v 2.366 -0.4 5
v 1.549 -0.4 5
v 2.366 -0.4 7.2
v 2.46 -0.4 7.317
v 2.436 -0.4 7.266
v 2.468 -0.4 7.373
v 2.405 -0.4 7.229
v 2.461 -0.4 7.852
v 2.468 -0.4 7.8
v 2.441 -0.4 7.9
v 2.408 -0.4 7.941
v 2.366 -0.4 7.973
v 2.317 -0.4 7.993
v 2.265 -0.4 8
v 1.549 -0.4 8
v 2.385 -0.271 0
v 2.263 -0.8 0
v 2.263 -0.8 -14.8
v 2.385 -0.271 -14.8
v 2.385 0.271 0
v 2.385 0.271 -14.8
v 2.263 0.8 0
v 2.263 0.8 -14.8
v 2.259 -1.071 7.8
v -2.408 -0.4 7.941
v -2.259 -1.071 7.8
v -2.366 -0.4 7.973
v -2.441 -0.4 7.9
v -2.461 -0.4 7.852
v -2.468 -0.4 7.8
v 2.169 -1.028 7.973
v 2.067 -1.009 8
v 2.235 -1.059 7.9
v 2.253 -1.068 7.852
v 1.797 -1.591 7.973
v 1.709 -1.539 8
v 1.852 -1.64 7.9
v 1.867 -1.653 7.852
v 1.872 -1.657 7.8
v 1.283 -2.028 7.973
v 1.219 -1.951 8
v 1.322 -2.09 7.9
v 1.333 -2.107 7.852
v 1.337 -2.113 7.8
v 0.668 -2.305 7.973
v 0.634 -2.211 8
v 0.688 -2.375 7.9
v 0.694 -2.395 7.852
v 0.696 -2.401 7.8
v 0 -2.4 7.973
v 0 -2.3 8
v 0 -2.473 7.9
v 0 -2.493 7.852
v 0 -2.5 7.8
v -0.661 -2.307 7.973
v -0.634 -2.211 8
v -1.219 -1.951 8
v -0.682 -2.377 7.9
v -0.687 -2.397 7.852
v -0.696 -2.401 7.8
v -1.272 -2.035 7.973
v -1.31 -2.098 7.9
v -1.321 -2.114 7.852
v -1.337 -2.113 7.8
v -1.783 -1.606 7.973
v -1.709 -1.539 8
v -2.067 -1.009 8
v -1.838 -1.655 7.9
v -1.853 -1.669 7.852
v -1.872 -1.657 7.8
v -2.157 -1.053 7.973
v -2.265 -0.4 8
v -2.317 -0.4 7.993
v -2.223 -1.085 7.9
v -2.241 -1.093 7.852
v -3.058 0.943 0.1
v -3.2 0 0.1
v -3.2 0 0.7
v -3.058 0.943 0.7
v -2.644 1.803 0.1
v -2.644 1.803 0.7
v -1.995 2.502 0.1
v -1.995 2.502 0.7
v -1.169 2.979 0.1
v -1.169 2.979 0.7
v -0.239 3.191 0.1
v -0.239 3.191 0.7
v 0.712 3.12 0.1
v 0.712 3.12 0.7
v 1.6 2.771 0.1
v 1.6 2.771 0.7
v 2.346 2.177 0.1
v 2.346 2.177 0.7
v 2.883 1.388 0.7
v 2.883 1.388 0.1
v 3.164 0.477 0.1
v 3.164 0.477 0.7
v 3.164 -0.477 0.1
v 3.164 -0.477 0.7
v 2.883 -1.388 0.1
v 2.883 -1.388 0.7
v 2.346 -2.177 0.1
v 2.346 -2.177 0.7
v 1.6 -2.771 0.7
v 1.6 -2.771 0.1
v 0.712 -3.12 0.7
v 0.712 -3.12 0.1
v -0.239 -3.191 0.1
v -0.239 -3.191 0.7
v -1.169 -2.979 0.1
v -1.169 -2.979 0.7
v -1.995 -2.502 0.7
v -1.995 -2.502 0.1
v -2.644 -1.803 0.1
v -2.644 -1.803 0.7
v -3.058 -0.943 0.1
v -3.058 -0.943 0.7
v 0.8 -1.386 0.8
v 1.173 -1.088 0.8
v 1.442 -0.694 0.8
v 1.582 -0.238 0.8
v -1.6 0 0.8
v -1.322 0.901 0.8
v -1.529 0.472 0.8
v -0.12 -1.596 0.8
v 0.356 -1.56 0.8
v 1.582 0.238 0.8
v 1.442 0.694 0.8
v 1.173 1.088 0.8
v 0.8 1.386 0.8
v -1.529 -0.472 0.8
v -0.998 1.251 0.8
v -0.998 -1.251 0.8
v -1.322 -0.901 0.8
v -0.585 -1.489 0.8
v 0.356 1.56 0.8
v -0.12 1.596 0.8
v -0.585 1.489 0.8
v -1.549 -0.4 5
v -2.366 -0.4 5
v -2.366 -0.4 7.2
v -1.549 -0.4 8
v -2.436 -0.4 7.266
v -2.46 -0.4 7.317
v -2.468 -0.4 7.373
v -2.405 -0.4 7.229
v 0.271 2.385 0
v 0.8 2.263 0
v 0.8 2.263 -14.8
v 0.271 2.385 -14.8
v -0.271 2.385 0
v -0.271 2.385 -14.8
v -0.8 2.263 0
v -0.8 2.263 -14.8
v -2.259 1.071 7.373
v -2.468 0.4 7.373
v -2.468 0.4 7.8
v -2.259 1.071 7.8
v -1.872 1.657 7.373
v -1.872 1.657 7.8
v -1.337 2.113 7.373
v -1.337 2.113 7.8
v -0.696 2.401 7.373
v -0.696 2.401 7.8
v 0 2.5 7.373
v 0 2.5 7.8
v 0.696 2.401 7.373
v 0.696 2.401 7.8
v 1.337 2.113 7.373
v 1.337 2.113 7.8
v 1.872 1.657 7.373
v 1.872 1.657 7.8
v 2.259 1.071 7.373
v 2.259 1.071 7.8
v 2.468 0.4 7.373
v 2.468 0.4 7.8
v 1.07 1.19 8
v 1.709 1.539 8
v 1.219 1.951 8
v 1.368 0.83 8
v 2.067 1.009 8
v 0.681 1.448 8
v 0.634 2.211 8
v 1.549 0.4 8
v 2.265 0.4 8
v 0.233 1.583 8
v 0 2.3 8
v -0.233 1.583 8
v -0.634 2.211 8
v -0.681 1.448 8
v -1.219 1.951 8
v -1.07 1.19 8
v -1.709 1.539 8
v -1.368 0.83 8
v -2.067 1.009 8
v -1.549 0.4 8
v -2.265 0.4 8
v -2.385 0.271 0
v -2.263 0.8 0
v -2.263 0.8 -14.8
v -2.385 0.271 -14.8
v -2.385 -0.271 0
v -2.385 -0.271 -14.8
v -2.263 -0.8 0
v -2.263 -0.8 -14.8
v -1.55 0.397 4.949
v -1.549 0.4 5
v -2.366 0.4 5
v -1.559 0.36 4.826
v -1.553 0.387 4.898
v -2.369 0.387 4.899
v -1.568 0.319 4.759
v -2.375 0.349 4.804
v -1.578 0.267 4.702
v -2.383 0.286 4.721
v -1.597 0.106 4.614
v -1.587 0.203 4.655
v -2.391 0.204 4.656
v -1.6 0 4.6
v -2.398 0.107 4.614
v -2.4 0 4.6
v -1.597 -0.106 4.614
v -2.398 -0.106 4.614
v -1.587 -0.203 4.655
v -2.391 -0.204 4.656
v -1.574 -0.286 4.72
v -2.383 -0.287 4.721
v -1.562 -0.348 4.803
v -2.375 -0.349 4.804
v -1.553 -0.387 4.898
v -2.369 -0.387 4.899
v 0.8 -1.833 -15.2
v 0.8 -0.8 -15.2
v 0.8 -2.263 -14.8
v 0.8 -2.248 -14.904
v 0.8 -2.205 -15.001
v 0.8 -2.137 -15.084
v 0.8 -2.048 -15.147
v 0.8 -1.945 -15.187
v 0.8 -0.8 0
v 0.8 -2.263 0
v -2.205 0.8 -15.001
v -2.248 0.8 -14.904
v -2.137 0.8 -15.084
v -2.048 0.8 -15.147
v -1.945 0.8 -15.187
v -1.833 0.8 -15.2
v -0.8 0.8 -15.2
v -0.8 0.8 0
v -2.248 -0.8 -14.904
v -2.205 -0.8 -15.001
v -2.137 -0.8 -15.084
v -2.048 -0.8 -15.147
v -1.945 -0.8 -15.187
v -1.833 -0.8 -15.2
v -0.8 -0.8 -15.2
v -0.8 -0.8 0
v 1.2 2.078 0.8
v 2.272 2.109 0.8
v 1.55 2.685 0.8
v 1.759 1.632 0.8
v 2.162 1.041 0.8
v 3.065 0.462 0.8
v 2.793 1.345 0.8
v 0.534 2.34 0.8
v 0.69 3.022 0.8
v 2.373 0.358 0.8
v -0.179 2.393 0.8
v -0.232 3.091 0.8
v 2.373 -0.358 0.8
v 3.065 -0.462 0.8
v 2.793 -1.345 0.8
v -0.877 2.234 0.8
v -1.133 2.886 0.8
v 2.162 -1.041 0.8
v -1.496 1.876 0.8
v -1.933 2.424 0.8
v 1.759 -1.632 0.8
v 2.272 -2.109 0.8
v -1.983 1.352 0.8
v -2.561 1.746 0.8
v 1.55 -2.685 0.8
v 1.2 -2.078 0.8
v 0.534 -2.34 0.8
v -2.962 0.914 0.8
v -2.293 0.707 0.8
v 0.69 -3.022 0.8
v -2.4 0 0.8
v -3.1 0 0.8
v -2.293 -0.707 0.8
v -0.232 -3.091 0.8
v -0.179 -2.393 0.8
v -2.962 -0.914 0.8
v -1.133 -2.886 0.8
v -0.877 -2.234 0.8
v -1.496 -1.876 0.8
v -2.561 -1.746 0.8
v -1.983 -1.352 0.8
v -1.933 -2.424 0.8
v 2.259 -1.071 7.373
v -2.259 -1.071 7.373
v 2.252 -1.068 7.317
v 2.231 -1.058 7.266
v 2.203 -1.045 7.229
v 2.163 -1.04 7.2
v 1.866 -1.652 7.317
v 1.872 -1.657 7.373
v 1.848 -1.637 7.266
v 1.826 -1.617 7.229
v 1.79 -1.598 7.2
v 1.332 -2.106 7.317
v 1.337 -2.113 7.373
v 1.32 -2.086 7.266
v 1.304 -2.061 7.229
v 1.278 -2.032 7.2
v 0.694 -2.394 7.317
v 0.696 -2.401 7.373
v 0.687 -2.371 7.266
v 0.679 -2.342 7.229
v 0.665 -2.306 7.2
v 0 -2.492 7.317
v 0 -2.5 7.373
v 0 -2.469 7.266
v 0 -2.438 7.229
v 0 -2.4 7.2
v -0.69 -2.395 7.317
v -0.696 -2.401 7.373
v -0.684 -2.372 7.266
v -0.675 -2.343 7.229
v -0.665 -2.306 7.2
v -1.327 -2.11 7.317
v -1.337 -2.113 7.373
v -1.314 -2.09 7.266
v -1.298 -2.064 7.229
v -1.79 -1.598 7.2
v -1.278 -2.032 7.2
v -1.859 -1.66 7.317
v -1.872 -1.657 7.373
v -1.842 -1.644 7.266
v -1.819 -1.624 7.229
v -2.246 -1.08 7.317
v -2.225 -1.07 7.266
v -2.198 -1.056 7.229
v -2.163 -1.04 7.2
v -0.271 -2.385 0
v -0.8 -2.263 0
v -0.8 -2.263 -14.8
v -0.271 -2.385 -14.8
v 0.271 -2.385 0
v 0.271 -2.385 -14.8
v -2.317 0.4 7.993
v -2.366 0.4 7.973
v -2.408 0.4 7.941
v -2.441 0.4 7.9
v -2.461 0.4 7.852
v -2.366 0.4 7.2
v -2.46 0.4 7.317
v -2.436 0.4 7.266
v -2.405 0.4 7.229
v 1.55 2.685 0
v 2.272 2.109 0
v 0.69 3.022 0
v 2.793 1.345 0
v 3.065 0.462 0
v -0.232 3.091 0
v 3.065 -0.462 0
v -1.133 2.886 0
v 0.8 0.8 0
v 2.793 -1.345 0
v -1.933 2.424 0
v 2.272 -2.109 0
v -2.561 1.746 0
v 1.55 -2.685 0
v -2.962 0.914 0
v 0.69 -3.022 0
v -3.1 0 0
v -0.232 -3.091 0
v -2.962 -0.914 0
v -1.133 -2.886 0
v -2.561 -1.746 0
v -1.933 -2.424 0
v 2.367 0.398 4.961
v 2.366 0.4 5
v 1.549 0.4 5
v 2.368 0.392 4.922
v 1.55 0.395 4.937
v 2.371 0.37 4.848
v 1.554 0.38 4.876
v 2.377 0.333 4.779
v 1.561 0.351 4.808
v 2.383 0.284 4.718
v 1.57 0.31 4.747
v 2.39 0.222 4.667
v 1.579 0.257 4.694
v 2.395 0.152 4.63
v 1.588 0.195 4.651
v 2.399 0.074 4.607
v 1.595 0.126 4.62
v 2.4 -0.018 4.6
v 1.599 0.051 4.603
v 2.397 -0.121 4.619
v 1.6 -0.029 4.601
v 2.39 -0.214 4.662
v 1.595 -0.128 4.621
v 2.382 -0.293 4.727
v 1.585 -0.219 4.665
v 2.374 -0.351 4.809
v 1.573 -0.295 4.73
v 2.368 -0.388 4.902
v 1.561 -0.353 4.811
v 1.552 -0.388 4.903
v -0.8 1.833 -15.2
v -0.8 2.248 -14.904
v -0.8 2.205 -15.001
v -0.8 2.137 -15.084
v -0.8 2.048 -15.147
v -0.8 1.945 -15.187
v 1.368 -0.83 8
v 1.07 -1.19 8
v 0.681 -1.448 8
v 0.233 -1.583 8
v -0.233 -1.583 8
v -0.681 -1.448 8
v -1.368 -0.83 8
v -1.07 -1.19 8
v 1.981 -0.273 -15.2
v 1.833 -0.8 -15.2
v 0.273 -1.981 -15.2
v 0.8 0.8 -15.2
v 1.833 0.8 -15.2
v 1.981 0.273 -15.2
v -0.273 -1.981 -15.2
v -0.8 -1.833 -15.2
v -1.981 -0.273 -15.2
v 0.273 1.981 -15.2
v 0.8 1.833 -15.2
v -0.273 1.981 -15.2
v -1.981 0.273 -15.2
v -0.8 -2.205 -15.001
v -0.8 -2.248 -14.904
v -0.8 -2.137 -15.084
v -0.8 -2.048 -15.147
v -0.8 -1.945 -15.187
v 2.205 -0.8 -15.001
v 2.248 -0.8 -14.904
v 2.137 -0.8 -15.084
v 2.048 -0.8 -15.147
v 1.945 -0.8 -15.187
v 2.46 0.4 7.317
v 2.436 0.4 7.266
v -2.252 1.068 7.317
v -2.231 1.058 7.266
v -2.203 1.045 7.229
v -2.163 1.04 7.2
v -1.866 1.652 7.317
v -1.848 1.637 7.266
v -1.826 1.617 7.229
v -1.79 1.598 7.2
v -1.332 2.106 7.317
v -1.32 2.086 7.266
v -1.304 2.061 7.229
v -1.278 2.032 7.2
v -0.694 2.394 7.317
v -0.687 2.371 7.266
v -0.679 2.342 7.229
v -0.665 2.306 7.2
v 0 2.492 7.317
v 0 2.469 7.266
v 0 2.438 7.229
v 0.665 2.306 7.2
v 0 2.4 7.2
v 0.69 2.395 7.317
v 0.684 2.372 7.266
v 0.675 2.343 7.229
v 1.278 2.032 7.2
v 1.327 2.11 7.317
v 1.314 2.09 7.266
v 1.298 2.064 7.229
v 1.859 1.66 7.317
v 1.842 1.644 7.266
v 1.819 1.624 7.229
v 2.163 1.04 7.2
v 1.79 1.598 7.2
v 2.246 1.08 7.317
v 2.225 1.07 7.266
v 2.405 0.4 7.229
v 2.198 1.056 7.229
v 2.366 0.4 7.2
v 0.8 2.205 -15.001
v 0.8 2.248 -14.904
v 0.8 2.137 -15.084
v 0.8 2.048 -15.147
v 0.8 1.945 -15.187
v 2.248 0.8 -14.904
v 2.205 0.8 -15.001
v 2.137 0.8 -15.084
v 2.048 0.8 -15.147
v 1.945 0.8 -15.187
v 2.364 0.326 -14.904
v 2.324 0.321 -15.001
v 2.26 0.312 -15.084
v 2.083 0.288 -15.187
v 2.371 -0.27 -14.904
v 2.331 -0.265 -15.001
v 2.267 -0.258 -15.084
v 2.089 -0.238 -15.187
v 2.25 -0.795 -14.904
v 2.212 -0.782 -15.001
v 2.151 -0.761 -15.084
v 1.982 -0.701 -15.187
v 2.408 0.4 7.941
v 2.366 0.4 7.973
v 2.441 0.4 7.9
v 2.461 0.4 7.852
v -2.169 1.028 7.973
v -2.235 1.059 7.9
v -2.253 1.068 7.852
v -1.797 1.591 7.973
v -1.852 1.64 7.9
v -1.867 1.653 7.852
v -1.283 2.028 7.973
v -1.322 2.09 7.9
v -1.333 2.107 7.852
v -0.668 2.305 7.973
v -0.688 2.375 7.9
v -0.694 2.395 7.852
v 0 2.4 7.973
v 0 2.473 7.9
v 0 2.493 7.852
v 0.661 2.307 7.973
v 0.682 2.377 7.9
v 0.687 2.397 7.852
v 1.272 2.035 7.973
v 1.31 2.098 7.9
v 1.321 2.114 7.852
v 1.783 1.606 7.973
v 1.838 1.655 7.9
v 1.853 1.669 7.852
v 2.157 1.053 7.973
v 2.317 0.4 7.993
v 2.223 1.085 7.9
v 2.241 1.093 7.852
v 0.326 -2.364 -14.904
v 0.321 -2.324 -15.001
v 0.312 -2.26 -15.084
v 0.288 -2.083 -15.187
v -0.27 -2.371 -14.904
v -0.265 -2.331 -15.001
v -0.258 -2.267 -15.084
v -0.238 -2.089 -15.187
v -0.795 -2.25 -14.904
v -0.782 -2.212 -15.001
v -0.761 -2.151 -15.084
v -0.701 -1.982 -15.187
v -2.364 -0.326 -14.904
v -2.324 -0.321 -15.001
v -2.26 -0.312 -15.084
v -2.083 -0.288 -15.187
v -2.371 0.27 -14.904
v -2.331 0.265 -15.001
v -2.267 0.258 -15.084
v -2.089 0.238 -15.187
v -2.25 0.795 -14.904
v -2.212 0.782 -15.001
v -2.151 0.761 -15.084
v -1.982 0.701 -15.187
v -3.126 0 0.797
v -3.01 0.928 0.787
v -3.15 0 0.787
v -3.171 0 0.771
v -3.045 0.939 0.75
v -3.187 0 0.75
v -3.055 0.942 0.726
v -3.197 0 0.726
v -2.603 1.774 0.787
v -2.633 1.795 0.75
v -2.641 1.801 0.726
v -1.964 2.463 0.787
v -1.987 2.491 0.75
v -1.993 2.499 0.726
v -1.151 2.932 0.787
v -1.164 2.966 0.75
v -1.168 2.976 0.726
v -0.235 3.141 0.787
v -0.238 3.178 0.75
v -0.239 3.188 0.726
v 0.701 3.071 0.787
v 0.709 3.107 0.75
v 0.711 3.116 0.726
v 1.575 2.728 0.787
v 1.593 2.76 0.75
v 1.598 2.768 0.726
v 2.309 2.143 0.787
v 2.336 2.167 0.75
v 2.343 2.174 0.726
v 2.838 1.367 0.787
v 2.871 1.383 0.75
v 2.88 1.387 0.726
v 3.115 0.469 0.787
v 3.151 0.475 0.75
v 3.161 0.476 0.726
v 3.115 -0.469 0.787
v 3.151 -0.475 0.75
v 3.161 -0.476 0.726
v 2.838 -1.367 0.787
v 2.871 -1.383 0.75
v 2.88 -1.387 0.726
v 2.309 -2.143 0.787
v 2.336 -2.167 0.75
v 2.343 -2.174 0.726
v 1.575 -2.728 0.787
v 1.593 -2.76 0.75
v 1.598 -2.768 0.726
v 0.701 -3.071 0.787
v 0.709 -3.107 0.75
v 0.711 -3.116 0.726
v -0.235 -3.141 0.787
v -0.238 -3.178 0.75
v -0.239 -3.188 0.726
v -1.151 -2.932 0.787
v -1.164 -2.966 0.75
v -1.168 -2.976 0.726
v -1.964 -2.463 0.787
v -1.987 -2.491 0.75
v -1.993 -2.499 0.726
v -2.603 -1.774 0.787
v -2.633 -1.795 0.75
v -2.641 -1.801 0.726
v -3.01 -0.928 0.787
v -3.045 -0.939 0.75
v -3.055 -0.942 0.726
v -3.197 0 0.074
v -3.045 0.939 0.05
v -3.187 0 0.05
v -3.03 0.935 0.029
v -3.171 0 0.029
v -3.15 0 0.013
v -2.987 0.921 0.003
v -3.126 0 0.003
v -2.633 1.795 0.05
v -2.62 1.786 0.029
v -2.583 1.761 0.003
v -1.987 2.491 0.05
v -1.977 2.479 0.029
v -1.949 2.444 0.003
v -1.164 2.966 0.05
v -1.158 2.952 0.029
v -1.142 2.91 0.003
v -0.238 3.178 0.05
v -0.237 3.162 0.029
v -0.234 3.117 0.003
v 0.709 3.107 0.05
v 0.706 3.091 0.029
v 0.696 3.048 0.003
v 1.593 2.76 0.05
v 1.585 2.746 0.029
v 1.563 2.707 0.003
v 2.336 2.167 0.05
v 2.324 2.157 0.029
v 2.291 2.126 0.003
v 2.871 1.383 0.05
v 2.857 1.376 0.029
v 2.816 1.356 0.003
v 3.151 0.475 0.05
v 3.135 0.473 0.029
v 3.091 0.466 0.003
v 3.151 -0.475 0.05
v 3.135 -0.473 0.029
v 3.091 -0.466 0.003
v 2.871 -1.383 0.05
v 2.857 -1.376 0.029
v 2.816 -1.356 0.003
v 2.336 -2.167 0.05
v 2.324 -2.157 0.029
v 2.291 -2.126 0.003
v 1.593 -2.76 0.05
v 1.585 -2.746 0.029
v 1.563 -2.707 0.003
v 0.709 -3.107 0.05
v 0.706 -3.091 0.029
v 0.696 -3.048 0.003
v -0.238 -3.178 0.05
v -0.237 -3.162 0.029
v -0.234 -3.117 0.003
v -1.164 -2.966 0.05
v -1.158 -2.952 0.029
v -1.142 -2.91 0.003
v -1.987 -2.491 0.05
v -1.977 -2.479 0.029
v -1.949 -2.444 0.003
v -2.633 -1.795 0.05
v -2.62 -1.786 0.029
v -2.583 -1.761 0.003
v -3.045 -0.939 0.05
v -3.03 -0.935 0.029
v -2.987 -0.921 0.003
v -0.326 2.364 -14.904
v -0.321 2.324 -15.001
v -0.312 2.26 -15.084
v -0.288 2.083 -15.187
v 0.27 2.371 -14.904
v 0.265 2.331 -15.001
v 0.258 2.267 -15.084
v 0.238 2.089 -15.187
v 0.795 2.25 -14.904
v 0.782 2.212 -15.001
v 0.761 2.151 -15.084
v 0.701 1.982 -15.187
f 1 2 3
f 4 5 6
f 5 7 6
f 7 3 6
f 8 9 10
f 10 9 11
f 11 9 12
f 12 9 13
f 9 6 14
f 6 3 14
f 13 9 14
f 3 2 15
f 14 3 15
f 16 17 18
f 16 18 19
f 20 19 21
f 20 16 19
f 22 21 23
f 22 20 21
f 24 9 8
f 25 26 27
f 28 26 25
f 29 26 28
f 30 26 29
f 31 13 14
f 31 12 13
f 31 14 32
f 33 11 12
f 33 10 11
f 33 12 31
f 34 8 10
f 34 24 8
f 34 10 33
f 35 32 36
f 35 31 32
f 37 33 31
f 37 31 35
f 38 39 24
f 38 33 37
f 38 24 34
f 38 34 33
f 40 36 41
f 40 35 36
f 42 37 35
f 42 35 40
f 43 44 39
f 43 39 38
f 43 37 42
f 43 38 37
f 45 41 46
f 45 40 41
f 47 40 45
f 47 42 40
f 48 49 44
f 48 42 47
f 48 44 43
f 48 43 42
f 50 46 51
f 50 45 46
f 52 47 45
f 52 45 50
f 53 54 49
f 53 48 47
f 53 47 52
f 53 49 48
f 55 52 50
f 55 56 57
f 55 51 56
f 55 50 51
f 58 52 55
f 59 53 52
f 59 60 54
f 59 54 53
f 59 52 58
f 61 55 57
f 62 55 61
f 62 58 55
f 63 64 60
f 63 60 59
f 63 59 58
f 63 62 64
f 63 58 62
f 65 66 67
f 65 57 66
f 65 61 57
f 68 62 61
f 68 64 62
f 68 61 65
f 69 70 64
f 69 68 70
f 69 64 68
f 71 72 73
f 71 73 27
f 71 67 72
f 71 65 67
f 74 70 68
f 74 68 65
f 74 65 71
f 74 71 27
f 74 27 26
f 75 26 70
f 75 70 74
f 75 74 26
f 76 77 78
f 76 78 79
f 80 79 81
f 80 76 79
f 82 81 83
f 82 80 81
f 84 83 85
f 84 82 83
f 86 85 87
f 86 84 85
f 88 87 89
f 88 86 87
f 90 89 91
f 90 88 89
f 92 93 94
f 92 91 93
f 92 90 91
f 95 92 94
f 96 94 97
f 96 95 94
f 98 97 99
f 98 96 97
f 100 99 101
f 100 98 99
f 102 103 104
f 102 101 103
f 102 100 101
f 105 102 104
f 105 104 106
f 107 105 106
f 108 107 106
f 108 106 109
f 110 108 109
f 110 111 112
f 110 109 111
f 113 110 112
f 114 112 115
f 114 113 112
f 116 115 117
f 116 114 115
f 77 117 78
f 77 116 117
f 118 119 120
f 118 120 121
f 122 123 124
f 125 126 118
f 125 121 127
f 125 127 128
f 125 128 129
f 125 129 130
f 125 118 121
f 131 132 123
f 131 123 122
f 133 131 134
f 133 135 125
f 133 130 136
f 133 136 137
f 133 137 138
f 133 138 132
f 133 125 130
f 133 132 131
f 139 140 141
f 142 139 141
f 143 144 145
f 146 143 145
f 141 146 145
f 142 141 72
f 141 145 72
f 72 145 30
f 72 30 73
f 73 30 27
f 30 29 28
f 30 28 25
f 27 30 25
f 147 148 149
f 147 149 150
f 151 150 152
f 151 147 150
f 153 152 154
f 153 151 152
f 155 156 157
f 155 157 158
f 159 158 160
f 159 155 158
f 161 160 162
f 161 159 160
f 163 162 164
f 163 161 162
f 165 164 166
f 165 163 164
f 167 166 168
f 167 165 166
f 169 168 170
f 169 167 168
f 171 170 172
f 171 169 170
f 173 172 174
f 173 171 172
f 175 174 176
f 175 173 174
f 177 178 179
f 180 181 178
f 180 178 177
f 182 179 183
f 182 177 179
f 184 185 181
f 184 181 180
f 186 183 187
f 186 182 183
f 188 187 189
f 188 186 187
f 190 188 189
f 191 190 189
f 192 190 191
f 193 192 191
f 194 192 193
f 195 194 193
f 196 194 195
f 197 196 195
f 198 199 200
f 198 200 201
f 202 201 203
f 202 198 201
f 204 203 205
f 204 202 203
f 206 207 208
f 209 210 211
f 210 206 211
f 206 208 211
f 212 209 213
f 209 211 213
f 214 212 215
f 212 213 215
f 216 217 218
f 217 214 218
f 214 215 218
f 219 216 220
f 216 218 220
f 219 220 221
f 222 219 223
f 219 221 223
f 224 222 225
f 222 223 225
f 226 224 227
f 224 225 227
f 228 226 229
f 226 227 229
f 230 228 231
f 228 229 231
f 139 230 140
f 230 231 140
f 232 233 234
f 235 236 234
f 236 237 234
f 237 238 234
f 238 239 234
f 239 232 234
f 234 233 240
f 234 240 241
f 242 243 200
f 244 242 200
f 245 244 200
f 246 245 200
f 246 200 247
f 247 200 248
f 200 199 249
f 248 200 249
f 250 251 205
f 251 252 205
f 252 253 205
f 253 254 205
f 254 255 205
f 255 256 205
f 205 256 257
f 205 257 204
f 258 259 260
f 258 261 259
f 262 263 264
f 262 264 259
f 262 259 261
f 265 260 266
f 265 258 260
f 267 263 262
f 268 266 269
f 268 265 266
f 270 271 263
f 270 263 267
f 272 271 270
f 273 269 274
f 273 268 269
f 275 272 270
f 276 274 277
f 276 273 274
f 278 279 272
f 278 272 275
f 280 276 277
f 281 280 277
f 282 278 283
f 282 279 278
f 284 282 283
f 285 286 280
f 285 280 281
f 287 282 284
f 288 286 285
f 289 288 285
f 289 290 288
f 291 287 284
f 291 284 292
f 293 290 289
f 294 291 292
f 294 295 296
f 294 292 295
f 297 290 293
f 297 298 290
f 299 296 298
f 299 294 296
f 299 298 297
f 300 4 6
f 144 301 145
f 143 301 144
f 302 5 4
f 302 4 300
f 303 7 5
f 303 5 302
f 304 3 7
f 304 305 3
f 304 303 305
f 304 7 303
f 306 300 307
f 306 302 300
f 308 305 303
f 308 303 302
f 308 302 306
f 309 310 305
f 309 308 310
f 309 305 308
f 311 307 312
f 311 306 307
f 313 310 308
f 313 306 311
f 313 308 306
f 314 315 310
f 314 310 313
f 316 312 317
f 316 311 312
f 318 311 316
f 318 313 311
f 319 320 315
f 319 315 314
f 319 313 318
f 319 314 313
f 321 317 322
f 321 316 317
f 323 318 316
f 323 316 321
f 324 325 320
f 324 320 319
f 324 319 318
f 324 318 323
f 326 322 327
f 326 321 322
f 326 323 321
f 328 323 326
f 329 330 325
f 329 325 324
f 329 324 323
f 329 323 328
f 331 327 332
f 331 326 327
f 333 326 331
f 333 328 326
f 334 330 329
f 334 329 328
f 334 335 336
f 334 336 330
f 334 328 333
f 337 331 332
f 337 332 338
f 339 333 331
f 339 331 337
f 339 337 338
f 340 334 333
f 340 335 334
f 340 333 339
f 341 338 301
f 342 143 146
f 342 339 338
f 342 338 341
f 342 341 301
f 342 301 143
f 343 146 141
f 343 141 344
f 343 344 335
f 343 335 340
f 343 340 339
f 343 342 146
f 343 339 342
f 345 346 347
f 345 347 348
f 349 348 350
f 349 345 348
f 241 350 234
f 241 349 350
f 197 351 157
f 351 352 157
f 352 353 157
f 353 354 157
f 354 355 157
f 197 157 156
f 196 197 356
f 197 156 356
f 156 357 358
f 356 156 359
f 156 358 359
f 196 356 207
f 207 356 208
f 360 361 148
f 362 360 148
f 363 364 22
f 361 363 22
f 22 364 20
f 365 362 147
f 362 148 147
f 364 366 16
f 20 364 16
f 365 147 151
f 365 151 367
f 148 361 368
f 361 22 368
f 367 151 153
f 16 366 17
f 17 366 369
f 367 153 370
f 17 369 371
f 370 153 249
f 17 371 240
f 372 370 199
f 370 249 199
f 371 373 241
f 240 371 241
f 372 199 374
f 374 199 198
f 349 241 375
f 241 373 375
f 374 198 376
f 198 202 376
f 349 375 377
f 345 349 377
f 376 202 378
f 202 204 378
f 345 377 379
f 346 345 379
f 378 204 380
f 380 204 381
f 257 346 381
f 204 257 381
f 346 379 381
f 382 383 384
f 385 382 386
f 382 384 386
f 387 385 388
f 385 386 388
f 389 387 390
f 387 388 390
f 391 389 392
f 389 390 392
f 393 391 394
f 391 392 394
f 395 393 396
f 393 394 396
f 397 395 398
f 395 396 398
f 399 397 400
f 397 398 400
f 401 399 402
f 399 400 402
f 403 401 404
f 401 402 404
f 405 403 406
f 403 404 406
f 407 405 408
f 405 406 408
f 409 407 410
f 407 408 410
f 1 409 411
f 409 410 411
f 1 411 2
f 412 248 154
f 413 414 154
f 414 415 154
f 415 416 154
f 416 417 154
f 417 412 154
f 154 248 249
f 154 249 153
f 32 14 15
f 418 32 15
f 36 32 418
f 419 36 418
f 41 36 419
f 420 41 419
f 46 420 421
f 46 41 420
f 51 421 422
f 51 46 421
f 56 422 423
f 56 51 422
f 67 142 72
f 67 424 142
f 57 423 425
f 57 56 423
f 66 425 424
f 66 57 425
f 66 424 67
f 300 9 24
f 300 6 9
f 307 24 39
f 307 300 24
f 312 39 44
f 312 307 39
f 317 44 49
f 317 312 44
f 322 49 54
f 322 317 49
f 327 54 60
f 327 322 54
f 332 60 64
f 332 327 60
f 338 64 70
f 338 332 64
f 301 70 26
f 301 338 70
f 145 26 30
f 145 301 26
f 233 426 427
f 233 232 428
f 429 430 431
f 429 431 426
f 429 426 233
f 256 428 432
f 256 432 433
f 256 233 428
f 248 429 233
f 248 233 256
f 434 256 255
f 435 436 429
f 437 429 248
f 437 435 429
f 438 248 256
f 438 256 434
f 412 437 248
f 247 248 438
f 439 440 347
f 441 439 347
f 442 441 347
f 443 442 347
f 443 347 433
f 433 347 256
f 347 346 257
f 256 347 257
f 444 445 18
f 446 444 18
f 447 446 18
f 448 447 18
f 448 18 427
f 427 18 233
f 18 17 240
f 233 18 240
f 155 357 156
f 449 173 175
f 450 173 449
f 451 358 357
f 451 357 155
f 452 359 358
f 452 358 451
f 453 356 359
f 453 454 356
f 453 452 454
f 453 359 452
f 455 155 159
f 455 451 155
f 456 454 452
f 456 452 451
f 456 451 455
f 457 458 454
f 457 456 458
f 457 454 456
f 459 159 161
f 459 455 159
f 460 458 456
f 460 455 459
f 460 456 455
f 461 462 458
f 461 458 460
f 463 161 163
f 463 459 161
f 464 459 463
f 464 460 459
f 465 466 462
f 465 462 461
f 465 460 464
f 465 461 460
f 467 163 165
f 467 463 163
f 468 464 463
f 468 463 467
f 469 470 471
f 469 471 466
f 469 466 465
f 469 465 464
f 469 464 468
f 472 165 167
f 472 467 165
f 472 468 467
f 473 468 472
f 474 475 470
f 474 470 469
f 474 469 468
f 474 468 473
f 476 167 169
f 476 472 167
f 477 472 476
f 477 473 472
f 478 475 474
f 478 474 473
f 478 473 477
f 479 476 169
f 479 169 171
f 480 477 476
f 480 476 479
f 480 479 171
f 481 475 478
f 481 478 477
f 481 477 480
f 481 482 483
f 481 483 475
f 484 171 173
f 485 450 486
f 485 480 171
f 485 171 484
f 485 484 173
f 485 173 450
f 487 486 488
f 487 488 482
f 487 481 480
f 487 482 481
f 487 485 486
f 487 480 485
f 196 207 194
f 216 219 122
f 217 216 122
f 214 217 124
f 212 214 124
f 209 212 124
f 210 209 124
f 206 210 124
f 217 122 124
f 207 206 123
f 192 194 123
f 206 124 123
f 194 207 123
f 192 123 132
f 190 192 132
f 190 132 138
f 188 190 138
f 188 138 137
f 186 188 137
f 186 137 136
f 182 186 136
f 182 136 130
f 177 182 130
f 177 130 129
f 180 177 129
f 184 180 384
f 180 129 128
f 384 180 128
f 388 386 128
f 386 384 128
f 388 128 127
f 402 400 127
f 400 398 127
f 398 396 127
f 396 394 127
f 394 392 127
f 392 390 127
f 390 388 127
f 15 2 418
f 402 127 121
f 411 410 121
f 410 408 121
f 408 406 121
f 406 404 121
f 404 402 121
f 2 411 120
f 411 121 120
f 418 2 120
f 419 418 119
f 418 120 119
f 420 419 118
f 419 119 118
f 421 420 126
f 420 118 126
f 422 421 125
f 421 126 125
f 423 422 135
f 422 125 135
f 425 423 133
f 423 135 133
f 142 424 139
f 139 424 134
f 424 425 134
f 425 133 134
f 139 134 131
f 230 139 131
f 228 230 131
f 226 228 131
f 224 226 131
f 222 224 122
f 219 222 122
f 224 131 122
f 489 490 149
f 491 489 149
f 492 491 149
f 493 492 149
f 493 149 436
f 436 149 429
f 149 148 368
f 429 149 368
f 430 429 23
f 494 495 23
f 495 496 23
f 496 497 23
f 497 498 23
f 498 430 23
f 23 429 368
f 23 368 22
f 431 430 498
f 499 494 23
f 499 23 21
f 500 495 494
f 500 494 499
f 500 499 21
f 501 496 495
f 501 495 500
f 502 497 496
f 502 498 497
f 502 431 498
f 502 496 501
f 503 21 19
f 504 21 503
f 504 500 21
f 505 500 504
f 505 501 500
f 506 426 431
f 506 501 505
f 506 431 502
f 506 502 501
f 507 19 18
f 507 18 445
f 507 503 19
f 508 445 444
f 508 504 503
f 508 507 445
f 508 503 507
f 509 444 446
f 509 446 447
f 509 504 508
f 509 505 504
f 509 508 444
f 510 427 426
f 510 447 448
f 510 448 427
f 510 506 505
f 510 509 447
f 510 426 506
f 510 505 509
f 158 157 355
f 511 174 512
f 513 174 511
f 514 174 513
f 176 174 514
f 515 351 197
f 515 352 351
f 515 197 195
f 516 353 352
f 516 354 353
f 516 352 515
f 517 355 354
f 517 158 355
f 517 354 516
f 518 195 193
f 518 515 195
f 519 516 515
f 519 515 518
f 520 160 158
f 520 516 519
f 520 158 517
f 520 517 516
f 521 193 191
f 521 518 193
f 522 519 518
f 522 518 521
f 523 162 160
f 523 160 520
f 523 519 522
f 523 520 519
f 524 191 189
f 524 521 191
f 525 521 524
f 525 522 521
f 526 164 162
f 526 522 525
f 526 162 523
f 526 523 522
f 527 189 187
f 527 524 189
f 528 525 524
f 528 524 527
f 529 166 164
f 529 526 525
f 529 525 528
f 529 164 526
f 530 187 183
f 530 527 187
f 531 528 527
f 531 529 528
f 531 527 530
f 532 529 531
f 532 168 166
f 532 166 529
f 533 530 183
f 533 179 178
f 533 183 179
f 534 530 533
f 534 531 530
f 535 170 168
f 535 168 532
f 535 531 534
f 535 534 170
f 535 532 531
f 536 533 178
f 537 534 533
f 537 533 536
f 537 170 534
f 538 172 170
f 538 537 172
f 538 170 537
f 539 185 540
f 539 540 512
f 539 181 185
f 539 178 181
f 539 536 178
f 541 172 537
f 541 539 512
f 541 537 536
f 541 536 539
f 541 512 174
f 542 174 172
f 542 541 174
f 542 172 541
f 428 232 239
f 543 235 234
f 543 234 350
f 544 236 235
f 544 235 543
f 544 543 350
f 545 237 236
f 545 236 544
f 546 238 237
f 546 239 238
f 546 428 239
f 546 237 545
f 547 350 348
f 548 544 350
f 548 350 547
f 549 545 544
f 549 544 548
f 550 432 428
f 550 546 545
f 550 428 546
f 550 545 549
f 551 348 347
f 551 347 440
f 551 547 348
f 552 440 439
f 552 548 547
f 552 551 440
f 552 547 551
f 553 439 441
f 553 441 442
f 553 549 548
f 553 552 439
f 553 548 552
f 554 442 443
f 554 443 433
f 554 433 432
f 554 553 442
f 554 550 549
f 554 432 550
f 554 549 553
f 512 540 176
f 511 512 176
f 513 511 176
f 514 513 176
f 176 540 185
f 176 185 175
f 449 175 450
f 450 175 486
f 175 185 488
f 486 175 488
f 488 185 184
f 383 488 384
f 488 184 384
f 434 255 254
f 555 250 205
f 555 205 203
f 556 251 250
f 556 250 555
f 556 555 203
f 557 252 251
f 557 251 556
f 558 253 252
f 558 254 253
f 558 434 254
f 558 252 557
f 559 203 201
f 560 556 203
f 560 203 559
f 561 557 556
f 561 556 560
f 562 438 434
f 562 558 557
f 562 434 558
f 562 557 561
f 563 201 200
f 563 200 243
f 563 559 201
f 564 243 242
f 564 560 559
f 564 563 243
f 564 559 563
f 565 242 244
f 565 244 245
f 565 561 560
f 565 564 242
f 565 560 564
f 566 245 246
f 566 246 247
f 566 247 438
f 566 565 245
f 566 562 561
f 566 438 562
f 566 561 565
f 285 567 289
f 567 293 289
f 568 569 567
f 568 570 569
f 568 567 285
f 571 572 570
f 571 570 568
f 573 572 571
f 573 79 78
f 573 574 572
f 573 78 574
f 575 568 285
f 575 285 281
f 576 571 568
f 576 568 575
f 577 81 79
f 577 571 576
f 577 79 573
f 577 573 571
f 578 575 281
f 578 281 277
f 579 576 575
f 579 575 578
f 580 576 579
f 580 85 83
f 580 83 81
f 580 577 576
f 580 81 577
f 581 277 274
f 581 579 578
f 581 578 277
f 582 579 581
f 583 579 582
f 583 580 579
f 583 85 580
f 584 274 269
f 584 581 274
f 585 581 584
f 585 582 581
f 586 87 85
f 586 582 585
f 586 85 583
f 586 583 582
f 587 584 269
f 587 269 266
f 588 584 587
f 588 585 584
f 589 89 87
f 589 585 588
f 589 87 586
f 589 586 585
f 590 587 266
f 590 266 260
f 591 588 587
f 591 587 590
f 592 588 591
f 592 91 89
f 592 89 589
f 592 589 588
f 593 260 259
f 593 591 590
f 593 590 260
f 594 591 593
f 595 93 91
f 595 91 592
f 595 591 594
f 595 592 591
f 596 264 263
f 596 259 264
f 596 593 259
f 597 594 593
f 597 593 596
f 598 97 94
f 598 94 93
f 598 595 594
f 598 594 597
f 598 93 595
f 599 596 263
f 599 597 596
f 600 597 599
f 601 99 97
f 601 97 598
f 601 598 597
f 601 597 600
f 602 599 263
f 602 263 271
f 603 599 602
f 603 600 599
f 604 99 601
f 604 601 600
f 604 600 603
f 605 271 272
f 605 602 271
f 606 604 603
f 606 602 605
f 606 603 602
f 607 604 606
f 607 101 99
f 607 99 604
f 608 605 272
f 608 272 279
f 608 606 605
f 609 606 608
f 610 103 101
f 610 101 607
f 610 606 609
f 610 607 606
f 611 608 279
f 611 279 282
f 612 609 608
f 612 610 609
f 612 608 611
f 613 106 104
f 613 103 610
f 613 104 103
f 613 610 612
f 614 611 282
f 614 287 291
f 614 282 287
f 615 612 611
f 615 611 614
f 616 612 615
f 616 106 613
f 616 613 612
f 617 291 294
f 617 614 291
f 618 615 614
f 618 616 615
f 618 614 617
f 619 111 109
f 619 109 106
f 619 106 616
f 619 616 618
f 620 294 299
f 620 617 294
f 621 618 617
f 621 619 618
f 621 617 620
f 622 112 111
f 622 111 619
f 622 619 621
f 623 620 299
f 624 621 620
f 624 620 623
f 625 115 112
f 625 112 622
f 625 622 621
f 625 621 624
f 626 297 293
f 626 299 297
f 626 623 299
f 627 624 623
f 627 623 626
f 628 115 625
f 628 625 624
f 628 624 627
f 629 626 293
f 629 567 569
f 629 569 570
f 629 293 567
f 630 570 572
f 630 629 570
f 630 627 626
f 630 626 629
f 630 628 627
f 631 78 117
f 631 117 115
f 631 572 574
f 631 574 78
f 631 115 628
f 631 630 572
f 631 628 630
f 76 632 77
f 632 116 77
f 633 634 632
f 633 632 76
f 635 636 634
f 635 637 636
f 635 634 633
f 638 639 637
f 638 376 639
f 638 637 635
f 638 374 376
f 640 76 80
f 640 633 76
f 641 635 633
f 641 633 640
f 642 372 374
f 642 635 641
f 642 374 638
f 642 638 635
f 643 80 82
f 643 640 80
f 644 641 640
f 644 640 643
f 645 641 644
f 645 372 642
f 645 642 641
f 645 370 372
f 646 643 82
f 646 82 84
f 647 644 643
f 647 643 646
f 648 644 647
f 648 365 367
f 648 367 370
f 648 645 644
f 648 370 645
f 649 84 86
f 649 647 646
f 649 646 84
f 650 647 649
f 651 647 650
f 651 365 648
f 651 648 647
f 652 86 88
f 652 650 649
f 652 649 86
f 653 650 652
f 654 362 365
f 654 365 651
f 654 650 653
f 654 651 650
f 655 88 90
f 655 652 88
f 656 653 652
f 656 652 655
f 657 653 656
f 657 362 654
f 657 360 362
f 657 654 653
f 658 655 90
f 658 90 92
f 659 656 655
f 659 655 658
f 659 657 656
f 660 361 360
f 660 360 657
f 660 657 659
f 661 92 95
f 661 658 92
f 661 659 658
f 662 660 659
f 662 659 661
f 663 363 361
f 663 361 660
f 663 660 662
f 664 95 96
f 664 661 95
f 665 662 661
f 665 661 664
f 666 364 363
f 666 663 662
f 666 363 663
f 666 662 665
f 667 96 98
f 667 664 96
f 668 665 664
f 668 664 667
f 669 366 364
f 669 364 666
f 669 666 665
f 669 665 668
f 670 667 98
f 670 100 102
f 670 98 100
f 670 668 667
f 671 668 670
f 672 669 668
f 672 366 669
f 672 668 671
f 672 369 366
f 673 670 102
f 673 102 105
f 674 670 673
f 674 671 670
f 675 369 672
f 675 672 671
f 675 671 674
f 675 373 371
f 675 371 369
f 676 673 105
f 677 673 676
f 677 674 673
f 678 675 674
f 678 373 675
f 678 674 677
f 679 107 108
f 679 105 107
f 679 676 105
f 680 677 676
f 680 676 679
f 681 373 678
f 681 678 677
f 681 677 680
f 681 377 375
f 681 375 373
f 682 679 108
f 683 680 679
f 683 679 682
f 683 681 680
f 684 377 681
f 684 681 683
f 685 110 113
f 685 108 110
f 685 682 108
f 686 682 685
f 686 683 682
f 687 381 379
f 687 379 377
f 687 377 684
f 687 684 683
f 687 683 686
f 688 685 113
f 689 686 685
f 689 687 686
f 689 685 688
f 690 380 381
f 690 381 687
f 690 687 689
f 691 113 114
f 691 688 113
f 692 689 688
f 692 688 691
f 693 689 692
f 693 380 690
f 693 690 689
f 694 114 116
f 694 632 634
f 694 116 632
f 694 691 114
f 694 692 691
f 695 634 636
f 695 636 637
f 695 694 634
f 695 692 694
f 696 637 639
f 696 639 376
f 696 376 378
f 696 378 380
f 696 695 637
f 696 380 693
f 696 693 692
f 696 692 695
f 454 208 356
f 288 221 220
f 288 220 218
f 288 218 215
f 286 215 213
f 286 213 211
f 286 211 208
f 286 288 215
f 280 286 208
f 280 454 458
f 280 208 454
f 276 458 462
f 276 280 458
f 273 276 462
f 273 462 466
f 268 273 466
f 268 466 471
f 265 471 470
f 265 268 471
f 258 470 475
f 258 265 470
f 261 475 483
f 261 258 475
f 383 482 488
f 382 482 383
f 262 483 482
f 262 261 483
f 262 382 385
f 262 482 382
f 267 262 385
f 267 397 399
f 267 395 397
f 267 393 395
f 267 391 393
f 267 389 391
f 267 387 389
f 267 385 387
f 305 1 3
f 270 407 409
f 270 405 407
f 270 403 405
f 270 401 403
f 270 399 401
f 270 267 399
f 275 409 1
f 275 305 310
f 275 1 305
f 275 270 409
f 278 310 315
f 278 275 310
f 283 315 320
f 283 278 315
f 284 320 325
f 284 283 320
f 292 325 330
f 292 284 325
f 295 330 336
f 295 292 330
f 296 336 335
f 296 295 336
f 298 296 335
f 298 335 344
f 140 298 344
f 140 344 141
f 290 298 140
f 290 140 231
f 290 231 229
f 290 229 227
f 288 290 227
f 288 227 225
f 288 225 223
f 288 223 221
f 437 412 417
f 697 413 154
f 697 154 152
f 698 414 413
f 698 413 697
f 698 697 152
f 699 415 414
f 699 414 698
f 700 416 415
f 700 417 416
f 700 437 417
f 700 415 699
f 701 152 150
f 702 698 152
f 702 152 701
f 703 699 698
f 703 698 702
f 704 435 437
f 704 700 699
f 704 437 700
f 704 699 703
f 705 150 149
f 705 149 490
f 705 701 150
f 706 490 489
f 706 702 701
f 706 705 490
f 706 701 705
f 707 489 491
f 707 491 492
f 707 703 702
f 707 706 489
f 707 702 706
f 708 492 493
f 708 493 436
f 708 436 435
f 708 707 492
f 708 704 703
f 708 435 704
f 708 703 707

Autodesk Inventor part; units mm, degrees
ref_plane "YZ Plane" through (0, 0, 0) normal (1, 0, 0) x (0, 1, 0)
ref_plane "XZ Plane" through (0, 0, 0) normal (0, 1, 0) x (-1, 0, 0)
ref_plane "XY Plane" through (0, 0, 0) normal (0, 0, 1) x (1, 0, 0)
sketch "Sketch1" plane through (0, 0, 0) normal (0, 1, 0) x (-1, 0, 0)
  line L0 (2.4, 7.2) -> (2.4, 0.8)
  line L1 (3.2, 0.8) -> (2.4, 0.8)
  line L2 (3.2, 0.8) -> (3.2, 0)
  line L3 (0, 0) -> (3.2, 0)
  line L4 (2.5, 8) -> (2.5, 7.2)
  line L5 (2.5, 8) -> (1.6, 8)
  line L6 (0, -1.6) -> (0, 9.6) projected
  line L7 (2.4, 7.2) -> (2.5, 7.2)
  line L8 (3.72, 0) -> (-0.62, 0) projected
  line L9 (0, 0) -> (0, 0.8)
  line L10 (0, 0.8) -> (1.6, 0.8)
  line L11 (1.6, 8) -> (1.6, 0.8)
  dimension "d1" = 4.8
  dimension "d2" = 5
  dimension "d7" = 0.8
  dimension "d8" = 6.4
  dimension "d9" = 0.8
  dimension "d40" = 3.2
  dimension "d44" = 0
  dimension "d46" = 8
revolve "Revolution1" add sketch "Sketch1" angle 360 about axis through (0, 0, -10) along (0, 0, 1)
fillet "Fillet1" radius 0.2 2 edges at (2.5, 0, 8) (2.5, 0, 7.2)
fillet "Fillet1" radius 0.1 2 edges at (3.2, 0, 0.8) (3.2, 0, 0)
sketch "Sketch2" plane through (0, 0, 0) normal (1, 0, 0) x (0, 1, 0)
  line L0 (-1.6, 8) -> (1.6, 8) projected
  line L1 (-0.4, 8) -> (0.4, 8)
  line L2 (0.4, 8) -> (0.4, 5)
  line L3 (-0.4, 5) -> (-0.4, 8)
  arc A0 (-0.4, 5) -> (0.4, 5) centre (0, 5) ccw
  point P0 (0, 0)
  point P1 (0, 8)
  dimension "d34" = 3.4
  dimension "d41" = 0.8
extrude "Extrusion2" cut sketch "Sketch2" along normal through all both and the other way through all
sketch "Sketch3" plane through (0, 0, 0) normal (0, 0, -1) x (-1, 0, 0)
  circle A0 centre (0, 0) radius 3.1 projected
  circle A1 centre (0, 0) radius 2.4 construction
  line L0 (-0.8, 2.2627) -> (-0.8, 0.8)
  line L1 (-0.8, 0.8) -> (-2.2627, 0.8)
  line L2 (-2.2627, -0.8) -> (-0.8, -0.8)
  line L3 (-0.8, -0.8) -> (-0.8, -2.2627)
  line L4 (0.8, -2.2627) -> (0.8, -0.8)
  line L5 (0.8, -0.8) -> (2.2627, -0.8)
  line L6 (2.2627, 0.8) -> (0.8, 0.8)
  line L7 (0.8, 0.8) -> (0.8, 2.2627)
  arc A2 (0.8, 2.2627) -> (-0.8, 2.2627) centre (0, 0) ccw
  arc A3 (-2.2627, 0.8) -> (-2.2627, -0.8) centre (0, 0) ccw
  arc A4 (-0.8, -2.2627) -> (0.8, -2.2627) centre (0, 0) ccw
  arc A5 (2.2627, -0.8) -> (2.2627, 0.8) centre (0, 0) ccw
  dimension "d35" = 4.8
  dimension "d36" = 1.6
extrude "Extrusion3" add sketch "Sketch3" along normal blind 15.2 contours A2 L7 L6 A5 L5 L4 A4 L3 L2 A3 L1 L0
fillet "Fillet2" radius 0.4 4 edges at (0, 2.4, -15.2) (2.4, 0, -15.2) (0, -2.4, -15.2) (-2.4, 0, -15.2)
equation "\"d1\" = tpd"
equation "\"d2\" = tpcd"
equation "\"d7\" = d9"
equation "\"d8\" = tsd"
equation "\"d9\" = tsl"
equation "\"d40\" = rd"
equation "\"d46\" = lu"
equation "\"d27\" = pinf"
equation "\"d28\" = lf"
equation "\"d34\" = tpnl"
equation "\"d41\" = tpnw"
equation "\"d35\" = kd"
equation "\"d36\" = axlet"
equation "\"d37\" = 2 * lu - tsl"
equation "\"d39\" = tf"
equation "\"tpd\" = 4.8"
equation "\"tpcd\" = 5"
equation "\"tsd\" = 6.4"
equation "\"tsl\" = 0.8"
equation "\"rd\" = 3.2"
equation "\"lu\" = 8"
equation "\"pinf\" = 0.2"
equation "\"lf\" = 0.1"
equation "\"tpnl\" = 3.4"
equation "\"tpnw\" = 0.8"
equation "\"kd\" = 4.8"
equation "\"axlet\" = 1.6"
equation "\"tf\" = 0.4"
properties part number "18651-Black" material "ABS Plastic"
